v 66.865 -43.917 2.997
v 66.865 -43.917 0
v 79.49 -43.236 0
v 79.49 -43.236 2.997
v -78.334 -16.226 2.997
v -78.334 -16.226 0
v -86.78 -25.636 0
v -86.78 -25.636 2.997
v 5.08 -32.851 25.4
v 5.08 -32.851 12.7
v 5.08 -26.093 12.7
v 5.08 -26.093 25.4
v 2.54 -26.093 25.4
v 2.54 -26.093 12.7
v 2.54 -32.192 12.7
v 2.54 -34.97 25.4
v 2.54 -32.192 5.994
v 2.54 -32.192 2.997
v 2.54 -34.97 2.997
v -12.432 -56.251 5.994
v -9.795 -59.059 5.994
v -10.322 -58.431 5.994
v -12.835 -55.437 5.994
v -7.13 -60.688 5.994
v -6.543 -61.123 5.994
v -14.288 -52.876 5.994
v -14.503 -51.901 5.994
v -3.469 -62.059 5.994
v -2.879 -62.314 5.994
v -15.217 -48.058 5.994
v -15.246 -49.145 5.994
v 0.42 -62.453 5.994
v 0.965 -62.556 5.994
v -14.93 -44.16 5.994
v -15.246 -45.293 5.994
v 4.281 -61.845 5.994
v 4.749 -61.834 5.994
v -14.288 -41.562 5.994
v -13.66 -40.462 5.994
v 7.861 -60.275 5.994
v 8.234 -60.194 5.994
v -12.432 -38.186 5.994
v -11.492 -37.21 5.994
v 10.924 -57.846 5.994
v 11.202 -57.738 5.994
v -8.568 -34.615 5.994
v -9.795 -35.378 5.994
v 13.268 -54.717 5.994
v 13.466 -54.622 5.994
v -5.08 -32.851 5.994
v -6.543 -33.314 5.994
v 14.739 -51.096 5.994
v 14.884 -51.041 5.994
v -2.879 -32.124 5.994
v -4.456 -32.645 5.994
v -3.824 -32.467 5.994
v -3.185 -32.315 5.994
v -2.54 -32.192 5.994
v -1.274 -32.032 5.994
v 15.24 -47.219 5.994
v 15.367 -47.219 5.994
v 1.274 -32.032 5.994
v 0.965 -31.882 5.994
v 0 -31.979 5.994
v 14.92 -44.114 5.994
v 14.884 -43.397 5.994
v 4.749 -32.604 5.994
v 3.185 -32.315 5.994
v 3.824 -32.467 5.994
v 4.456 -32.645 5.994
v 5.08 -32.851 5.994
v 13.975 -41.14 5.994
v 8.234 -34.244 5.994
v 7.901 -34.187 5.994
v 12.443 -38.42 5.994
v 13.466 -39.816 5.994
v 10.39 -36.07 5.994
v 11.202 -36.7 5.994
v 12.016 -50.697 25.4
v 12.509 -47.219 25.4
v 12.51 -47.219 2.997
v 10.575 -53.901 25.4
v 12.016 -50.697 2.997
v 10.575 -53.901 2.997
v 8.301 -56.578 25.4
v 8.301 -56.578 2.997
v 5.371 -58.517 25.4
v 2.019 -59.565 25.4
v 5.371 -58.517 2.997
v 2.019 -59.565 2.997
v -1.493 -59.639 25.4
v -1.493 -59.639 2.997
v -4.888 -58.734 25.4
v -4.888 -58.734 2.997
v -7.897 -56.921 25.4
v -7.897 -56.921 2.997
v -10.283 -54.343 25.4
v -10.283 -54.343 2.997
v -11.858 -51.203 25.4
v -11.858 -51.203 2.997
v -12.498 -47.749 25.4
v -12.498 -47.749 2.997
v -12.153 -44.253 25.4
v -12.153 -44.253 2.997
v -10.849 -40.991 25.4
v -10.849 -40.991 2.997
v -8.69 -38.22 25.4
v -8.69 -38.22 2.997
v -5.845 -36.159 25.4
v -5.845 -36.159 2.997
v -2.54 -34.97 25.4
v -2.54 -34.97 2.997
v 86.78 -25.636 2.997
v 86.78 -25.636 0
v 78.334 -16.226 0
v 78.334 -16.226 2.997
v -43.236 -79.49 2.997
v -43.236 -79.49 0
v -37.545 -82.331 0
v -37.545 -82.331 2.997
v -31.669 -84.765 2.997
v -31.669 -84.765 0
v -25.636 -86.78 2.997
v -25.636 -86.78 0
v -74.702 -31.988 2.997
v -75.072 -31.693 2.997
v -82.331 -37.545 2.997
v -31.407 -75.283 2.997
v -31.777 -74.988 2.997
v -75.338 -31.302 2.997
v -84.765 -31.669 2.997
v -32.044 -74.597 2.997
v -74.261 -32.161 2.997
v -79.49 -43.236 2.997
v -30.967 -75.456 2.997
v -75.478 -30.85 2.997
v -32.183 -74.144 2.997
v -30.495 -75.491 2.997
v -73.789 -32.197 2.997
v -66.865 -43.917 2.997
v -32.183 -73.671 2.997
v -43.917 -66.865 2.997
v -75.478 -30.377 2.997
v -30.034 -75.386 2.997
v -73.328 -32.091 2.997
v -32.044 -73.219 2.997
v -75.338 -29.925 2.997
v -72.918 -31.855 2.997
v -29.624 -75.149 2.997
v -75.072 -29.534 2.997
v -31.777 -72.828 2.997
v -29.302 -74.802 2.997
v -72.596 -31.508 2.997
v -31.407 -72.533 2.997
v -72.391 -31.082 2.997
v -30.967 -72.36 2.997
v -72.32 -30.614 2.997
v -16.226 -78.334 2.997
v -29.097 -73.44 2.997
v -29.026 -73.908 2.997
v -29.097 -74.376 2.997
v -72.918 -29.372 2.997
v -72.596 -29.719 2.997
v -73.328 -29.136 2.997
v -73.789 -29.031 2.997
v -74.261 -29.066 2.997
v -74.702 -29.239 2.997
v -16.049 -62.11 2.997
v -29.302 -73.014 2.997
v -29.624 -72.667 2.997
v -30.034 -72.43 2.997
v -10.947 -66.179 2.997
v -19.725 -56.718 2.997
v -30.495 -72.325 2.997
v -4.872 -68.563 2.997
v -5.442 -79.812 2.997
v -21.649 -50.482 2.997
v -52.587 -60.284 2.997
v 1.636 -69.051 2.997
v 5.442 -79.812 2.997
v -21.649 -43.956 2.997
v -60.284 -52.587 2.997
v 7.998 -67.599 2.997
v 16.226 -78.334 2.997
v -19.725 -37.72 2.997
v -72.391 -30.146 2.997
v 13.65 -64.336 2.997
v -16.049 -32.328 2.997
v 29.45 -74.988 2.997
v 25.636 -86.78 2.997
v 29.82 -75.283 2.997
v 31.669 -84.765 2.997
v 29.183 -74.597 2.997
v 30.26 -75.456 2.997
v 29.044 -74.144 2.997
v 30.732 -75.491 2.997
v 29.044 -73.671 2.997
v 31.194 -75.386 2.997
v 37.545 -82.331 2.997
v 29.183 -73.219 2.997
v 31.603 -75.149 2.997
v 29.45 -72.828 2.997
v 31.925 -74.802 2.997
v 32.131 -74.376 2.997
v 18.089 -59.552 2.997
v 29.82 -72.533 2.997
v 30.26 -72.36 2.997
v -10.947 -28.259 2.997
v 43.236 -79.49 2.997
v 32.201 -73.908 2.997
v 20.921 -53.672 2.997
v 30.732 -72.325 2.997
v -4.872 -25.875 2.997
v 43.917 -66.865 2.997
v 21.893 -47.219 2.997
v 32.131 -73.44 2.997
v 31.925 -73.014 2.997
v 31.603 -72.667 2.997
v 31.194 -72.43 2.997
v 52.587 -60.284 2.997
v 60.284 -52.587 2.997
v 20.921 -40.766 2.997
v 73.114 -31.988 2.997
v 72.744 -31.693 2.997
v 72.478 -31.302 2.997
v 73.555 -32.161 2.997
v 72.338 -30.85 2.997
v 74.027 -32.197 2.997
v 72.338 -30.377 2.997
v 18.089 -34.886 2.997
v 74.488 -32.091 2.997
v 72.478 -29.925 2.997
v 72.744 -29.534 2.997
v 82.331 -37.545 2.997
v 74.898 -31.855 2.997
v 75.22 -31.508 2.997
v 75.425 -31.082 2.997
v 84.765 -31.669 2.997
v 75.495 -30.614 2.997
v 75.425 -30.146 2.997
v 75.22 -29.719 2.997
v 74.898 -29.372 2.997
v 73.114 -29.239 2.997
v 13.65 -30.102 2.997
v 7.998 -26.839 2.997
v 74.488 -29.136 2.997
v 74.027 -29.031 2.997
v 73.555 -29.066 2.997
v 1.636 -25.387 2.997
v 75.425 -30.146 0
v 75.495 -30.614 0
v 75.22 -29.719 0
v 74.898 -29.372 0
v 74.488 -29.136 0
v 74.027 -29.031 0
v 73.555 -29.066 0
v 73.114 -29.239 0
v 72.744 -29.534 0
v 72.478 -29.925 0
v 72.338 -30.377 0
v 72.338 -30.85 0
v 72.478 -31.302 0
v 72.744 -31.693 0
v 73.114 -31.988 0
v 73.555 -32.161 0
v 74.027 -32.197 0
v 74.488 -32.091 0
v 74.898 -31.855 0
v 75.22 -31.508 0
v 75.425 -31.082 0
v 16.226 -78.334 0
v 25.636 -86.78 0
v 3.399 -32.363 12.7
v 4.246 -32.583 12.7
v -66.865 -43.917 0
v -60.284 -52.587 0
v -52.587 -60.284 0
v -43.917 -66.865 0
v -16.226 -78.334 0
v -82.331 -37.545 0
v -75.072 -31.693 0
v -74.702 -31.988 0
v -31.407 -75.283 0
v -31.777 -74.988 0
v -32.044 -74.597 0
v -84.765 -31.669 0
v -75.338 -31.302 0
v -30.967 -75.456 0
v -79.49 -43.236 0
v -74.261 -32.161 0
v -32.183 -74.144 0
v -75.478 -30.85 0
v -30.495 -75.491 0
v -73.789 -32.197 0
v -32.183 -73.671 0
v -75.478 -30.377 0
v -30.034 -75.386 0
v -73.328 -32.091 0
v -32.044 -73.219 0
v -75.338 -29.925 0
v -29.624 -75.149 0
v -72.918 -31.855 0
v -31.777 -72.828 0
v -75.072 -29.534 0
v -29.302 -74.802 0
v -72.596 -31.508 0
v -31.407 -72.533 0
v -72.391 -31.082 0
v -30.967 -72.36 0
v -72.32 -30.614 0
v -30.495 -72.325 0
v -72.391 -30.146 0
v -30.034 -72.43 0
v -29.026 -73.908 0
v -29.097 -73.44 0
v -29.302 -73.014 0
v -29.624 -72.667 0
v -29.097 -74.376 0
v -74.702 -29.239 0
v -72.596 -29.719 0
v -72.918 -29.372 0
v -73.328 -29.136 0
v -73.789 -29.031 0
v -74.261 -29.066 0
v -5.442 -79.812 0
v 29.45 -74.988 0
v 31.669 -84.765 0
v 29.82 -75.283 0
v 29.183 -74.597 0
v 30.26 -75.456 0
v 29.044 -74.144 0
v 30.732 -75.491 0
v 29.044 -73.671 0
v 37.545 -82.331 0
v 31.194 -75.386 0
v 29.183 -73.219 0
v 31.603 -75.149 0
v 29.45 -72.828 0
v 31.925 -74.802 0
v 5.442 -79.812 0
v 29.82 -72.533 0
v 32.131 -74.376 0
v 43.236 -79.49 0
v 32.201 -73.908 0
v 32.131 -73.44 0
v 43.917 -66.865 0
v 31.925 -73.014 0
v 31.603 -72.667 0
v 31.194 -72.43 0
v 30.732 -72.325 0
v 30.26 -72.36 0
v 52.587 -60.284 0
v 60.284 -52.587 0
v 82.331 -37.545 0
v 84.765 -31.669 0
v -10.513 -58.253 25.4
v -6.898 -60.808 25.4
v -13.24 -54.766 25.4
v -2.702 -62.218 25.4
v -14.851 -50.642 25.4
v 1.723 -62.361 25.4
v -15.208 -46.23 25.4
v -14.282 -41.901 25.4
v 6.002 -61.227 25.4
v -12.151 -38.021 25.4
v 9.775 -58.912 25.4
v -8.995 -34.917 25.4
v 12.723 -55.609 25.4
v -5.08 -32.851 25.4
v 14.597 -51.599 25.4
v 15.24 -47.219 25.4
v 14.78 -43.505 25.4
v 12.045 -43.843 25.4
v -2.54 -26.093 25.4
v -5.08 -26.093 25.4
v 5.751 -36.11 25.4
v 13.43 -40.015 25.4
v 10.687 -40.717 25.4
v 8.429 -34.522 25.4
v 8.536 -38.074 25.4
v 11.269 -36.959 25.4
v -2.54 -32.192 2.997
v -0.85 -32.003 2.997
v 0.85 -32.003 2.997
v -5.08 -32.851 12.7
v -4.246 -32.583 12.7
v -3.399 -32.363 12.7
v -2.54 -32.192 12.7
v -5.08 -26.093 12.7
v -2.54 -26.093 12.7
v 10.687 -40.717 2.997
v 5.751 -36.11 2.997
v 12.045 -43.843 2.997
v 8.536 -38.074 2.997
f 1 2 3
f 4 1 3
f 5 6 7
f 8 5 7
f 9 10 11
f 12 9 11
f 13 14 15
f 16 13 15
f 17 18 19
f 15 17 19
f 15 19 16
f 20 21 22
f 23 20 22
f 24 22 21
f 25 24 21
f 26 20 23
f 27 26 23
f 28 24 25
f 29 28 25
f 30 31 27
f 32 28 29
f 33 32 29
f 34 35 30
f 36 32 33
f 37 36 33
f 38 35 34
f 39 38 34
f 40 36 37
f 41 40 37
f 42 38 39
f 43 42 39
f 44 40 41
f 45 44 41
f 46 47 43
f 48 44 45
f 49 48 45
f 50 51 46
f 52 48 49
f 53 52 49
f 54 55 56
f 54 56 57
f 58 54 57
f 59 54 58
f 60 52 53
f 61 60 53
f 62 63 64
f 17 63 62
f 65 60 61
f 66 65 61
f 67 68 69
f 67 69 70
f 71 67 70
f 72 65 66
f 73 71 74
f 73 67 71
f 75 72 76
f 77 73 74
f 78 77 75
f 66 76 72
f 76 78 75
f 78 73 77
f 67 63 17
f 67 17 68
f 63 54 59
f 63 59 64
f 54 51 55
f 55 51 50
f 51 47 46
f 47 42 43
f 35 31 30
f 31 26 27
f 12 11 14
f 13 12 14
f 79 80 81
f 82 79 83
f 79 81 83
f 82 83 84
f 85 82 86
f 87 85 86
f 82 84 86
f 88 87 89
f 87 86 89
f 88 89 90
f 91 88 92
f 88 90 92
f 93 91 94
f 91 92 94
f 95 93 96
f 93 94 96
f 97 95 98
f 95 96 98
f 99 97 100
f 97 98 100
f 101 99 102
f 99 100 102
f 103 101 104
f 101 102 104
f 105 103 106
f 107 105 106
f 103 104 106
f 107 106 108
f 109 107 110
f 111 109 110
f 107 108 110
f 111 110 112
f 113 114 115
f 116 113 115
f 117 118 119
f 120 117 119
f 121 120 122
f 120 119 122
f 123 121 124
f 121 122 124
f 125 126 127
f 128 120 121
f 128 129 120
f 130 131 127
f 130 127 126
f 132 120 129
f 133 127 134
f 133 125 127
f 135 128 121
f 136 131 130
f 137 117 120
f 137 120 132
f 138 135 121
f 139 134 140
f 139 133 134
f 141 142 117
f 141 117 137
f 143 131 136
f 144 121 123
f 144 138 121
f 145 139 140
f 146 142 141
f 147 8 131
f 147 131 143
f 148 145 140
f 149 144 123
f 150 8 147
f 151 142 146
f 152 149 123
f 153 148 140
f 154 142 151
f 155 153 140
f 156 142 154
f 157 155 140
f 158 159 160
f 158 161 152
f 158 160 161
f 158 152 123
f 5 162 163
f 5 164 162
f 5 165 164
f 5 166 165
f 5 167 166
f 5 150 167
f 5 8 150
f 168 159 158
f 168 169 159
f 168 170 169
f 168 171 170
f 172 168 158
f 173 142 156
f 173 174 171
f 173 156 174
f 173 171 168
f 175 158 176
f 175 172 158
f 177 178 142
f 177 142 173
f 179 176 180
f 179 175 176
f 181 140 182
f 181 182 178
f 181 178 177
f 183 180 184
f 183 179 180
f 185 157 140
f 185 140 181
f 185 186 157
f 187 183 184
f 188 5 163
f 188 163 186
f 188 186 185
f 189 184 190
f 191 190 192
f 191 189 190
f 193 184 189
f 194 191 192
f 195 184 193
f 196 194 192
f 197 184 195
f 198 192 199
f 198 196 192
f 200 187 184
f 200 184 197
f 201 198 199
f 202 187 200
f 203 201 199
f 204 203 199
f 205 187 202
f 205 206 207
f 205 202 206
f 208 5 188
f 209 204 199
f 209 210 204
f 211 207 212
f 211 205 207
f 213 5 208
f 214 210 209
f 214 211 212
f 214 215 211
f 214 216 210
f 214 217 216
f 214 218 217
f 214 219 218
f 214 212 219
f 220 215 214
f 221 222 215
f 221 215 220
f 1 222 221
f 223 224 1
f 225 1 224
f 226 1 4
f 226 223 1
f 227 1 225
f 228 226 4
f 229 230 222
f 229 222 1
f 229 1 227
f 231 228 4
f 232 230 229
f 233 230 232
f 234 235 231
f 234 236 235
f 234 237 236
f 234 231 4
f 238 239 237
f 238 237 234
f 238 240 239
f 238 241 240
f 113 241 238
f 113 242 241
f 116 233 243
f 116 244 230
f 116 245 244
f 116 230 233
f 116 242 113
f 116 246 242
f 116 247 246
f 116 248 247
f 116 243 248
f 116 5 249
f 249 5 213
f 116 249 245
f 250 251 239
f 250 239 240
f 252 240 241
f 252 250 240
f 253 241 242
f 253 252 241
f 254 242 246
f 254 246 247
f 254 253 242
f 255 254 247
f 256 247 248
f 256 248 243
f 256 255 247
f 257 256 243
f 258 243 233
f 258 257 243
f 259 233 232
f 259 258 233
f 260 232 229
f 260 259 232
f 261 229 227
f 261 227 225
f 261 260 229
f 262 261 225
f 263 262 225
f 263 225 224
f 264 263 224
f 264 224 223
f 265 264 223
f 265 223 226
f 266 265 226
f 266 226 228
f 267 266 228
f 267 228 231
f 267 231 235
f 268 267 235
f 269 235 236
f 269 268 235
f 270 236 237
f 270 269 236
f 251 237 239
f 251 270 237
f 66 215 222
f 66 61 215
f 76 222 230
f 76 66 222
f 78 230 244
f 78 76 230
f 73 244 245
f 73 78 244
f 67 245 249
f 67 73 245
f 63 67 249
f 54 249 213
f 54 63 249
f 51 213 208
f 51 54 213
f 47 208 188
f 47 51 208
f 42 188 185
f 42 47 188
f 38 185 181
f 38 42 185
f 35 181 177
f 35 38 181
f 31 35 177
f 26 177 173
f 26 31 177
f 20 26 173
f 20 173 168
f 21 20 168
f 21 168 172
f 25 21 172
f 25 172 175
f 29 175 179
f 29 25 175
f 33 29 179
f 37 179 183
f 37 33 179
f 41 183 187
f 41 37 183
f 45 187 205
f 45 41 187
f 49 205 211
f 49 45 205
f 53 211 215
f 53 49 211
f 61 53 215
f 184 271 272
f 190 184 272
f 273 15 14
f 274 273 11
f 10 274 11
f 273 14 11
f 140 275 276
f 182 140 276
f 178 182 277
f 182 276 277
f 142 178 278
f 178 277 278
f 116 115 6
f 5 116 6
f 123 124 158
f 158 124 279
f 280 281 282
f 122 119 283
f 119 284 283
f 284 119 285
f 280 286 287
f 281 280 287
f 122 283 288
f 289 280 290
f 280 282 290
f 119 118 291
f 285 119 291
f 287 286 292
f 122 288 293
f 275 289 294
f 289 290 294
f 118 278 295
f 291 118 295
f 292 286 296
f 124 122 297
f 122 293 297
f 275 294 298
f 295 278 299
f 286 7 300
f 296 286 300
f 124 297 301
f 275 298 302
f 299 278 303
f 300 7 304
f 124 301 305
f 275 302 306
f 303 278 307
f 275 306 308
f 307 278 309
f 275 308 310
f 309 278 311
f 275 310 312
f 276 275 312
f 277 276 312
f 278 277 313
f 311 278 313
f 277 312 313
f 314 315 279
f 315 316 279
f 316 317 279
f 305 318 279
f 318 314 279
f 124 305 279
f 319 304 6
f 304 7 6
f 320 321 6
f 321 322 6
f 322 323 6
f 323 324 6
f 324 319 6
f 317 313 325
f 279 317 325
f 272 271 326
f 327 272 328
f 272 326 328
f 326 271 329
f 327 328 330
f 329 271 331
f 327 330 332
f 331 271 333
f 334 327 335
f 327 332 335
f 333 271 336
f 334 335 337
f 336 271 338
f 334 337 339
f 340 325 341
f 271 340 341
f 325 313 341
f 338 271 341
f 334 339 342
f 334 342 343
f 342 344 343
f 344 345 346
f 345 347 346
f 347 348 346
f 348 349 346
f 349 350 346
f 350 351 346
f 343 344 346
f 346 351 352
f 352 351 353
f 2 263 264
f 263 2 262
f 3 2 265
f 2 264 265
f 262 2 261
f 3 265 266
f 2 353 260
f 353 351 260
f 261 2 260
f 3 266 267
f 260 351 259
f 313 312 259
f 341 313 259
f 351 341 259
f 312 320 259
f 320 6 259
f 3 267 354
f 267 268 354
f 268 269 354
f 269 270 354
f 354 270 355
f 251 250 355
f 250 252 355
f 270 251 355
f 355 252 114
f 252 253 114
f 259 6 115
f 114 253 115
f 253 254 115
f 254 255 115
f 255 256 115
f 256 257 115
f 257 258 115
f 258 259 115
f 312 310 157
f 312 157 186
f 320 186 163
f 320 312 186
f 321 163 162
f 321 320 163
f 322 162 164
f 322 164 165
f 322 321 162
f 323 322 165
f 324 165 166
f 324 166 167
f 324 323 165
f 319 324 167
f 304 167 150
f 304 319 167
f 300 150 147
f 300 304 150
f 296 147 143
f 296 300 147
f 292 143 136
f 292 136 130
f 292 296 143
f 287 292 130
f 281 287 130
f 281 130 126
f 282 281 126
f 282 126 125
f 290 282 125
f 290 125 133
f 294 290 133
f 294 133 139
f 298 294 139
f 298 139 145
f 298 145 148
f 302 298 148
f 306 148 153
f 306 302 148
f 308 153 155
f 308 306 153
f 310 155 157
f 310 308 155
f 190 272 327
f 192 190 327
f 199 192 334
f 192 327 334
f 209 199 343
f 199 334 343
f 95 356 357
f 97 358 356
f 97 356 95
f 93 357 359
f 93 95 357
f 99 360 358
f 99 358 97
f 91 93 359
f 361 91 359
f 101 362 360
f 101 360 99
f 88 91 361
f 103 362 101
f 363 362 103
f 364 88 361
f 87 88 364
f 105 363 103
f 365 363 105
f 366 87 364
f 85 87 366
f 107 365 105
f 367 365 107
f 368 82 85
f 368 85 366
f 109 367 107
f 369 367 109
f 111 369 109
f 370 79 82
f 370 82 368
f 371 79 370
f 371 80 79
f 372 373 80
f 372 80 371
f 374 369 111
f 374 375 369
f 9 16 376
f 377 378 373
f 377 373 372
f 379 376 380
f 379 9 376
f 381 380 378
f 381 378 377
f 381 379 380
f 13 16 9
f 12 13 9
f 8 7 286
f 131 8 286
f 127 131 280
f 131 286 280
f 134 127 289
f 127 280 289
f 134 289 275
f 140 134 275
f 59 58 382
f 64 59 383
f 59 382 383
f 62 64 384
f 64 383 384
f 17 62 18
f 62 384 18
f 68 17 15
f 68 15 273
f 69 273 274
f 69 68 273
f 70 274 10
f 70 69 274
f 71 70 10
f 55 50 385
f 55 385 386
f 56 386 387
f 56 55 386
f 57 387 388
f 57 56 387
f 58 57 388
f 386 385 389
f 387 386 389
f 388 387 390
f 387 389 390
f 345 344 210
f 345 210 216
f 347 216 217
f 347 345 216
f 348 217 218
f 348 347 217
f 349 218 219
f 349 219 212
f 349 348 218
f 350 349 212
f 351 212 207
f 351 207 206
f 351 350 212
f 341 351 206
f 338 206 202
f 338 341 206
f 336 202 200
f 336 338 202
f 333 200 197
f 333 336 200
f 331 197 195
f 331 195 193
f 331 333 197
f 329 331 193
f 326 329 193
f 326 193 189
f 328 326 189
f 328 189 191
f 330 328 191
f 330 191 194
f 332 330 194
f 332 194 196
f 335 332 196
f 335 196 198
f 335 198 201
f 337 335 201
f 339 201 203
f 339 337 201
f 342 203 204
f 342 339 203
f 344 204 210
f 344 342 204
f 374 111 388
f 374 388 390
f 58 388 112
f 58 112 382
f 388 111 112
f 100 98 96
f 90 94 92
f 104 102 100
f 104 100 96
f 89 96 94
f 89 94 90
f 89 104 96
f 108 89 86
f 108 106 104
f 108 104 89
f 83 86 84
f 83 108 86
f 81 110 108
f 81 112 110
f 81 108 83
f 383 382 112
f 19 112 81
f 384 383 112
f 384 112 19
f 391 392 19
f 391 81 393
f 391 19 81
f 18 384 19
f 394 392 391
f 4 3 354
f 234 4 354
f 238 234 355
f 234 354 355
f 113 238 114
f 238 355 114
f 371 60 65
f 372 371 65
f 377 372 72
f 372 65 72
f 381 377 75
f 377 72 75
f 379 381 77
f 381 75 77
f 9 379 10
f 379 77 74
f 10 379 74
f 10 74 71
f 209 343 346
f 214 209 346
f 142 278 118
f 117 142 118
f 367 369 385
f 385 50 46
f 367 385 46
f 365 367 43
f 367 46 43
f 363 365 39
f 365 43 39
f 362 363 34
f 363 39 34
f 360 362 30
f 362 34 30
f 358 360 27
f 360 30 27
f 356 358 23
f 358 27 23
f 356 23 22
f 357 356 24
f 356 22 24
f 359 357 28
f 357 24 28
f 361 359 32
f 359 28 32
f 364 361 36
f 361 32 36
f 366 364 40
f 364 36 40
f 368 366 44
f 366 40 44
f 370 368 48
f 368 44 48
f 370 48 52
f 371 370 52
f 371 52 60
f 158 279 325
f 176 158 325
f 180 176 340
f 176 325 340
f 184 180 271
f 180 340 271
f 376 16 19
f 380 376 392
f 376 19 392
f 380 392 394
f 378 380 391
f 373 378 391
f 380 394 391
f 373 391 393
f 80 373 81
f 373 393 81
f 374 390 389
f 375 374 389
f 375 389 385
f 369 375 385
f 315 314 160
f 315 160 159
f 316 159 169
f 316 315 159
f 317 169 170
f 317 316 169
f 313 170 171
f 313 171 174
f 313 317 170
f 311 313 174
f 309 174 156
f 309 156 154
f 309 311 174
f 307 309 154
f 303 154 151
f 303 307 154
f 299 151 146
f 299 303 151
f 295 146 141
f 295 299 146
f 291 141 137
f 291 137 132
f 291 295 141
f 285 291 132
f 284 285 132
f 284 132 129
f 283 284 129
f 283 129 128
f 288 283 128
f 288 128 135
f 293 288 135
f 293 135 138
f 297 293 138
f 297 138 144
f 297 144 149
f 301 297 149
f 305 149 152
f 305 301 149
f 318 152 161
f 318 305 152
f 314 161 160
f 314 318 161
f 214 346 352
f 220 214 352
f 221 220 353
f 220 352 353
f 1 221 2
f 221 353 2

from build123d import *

# Parameters (mm, degrees)
F0_R     = 1.5875
F0_R_2   = 22.225
F1_DEPTH = 2.9972
F2_DEPTH = 25.4
F3_DEPTH = 25.4
F4_DEPTH = 12.7
F5_DEPTH = 2.9972
F6_DEPTH = 5.9944


# Not quite as in the source:
# - a fillet or chamfer that OpenCascade refuses, or shapes differently, is made with other operations: its cross-section is extruded or revolved along the edge and cut away or added


with BuildPart() as f1:
    # F0 (on Top) → F1 (new body)
    with BuildSketch(Plane.XY):
        with BuildLine():
            Line((-78.3343552322, -16.2264228234), (-86.7801633577, -25.6357348999))
            ThreePointArc((-86.7801633577, -25.6357348999), (-83.5995491981, -34.6280670861), (-79.4900439712, -43.2356399943))
            Line((-79.4900439712, -43.2356399943), (-66.8645673974, -43.9169401718))
            ThreePointArc((-66.8645673974, -43.9169401718), (-56.5666333066, -56.5666333066), (-43.9169401718, -66.8645673974))
            Line((-43.9169401718, -66.8645673974), (-43.2356399943, -79.4900439712))
            ThreePointArc((-43.2356399943, -79.4900439712), (-34.6280670861, -83.5995491981), (-25.6357348999, -86.7801633577))
            Line((-25.6357348999, -86.7801633577), (-16.2264228234, -78.3343552322))
            ThreePointArc((-16.2264228234, -78.3343552322), (0, -79.9973), (16.2264228234, -78.3343552322))
            Line((16.2264228234, -78.3343552322), (25.6357348999, -86.7801633577))
            ThreePointArc((25.6357348999, -86.7801633577), (34.6280670861, -83.5995491981), (43.2356399943, -79.4900439712))
            Line((43.2356399943, -79.4900439712), (43.9169401718, -66.8645673974))
            ThreePointArc((43.9169401718, -66.8645673974), (56.5666333066, -56.5666333066), (66.8645673974, -43.9169401718))
            Line((66.8645673974, -43.9169401718), (79.4900439712, -43.2356399943))
            ThreePointArc((79.4900439712, -43.2356399943), (83.5995491981, -34.6280670861), (86.7801633577, -25.6357348999))
            Line((86.7801633577, -25.6357348999), (78.3343552322, -16.2264228234))
            Line((78.3343552322, -16.2264228234), (-78.3343552322, -16.2264228234))
        make_face()
        with Locations((-30.6136413439, -73.9078681262)):
            Circle(F0_R, mode=Mode.SUBTRACT)
        with Locations((30.6136413439, -73.9078681262)):
            Circle(F0_R, mode=Mode.SUBTRACT)
        with Locations((0, -47.218952328)):
            Circle(F0_R_2, mode=Mode.SUBTRACT)
        with Locations((-73.9078681262, -30.6136413439)):
            Circle(F0_R, mode=Mode.SUBTRACT)
        with Locations((73.9078681262, -30.6136413439)):
            Circle(F0_R, mode=Mode.SUBTRACT)
        with Locations((0, -47.218952328)):
            Circle(F0_R_2)
        with BuildLine():
            ThreePointArc((5.08, -32.8505425343), (12.4434078933, -38.4201342255), (15.24, -47.218952328))
            ThreePointArc((15.24, -47.218952328), (-8.7988181024, -59.6623602213), (-5.08, -32.8505425343))
            Line((-5.08, -32.8505425343), (-5.08, -26.0933935642))
            Line((-5.08, -26.0933935642), (-2.54, -26.0933935642))
            Line((-2.54, -26.0933935642), (-2.54, -32.1921096789))
            ThreePointArc((-2.54, -32.1921096789), (0, -31.978952328), (2.54, -32.1921096789))
            Line((2.54, -32.1921096789), (2.54, -26.0933935642))
            Line((2.54, -26.0933935642), (5.08, -26.0933935642))
            Line((5.08, -26.0933935642), (5.08, -32.8505425343))
        make_face(mode=Mode.SUBTRACT)
        with BuildLine():
            ThreePointArc((-5.08, -32.8505425343), (-8.7988181024, -59.6623602213), (15.24, -47.218952328))
            ThreePointArc((15.24, -47.218952328), (12.4434078933, -38.4201342255), (5.08, -32.8505425343))
            ThreePointArc((5.08, -32.8505425343), (3.8241970996, -32.466558741), (2.54, -32.1921096789))
            Line((2.54, -32.1921096789), (2.54, -34.9700344064))
            ThreePointArc((2.54, -34.9700344064), (9.7021059634, -39.3223245588), (12.5095, -47.218952328))
            ThreePointArc((12.5095, -47.218952328), (-7.8966277692, -56.9210582914), (-2.54, -34.9700344064))
            Line((-2.54, -34.9700344064), (-2.54, -32.1921096789))
            ThreePointArc((-2.54, -32.1921096789), (-3.8241970996, -32.466558741), (-5.08, -32.8505425343))
        make_face()
        with BuildLine():
            ThreePointArc((2.54, -32.1921096789), (3.8241970996, -32.466558741), (5.08, -32.8505425343))
            Line((5.08, -32.8505425343), (5.08, -26.0933935642))
            Line((5.08, -26.0933935642), (2.54, -26.0933935642))
            Line((2.54, -26.0933935642), (2.54, -32.1921096789))
        make_face()
        with BuildLine():
            Line((-5.08, -26.0933935642), (-5.08, -32.8505425343))
            ThreePointArc((-5.08, -32.8505425343), (-3.8241970996, -32.466558741), (-2.54, -32.1921096789))
            Line((-2.54, -32.1921096789), (-2.54, -26.0933935642))
            Line((-2.54, -26.0933935642), (-5.08, -26.0933935642))
        make_face()
        with BuildLine():
            Line((2.54, -34.9700344064), (2.54, -32.1921096789))
            ThreePointArc((2.54, -32.1921096789), (0, -31.978952328), (-2.54, -32.1921096789))
            Line((-2.54, -32.1921096789), (-2.54, -34.9700344064))
            ThreePointArc((-2.54, -34.9700344064), (0, -34.709452328), (2.54, -34.9700344064))
        make_face()
        with BuildLine():
            ThreePointArc((12.5095, -47.218952328), (9.7021059634, -39.3223245588), (2.54, -34.9700344064))
            ThreePointArc((2.54, -34.9700344064), (0, -34.709452328), (-2.54, -34.9700344064))
            ThreePointArc((-2.54, -34.9700344064), (-7.8966277692, -56.9210582914), (12.5095, -47.218952328))
        make_face()
    extrude(amount=F1_DEPTH)

    # F0 (on Top) → F2 (join)
    with BuildSketch(Plane.XY):
        with BuildLine():
            ThreePointArc((-5.08, -32.8505425343), (-8.7988181024, -59.6623602213), (15.24, -47.218952328))
            ThreePointArc((15.24, -47.218952328), (12.4434078933, -38.4201342255), (5.08, -32.8505425343))
            ThreePointArc((5.08, -32.8505425343), (3.8241970996, -32.466558741), (2.54, -32.1921096789))
            Line((2.54, -32.1921096789), (2.54, -34.9700344064))
            ThreePointArc((2.54, -34.9700344064), (9.7021059634, -39.3223245588), (12.5095, -47.218952328))
            ThreePointArc((12.5095, -47.218952328), (-7.8966277692, -56.9210582914), (-2.54, -34.9700344064))
            Line((-2.54, -34.9700344064), (-2.54, -32.1921096789))
            ThreePointArc((-2.54, -32.1921096789), (-3.8241970996, -32.466558741), (-5.08, -32.8505425343))
        make_face()
    extrude(amount=F2_DEPTH)

    # F0 (on Top) → F3 (join)
    with BuildSketch(Plane.XY):
        with BuildLine():
            ThreePointArc((-5.08, -32.8505425343), (-8.7988181024, -59.6623602213), (15.24, -47.218952328))
            ThreePointArc((15.24, -47.218952328), (12.4434078933, -38.4201342255), (5.08, -32.8505425343))
            ThreePointArc((5.08, -32.8505425343), (3.8241970996, -32.466558741), (2.54, -32.1921096789))
            Line((2.54, -32.1921096789), (2.54, -34.9700344064))
            ThreePointArc((2.54, -34.9700344064), (9.7021059634, -39.3223245588), (12.5095, -47.218952328))
            ThreePointArc((12.5095, -47.218952328), (-7.8966277692, -56.9210582914), (-2.54, -34.9700344064))
            Line((-2.54, -34.9700344064), (-2.54, -32.1921096789))
            ThreePointArc((-2.54, -32.1921096789), (-3.8241970996, -32.466558741), (-5.08, -32.8505425343))
        make_face()
        with BuildLine():
            ThreePointArc((2.54, -32.1921096789), (3.8241970996, -32.466558741), (5.08, -32.8505425343))
            Line((5.08, -32.8505425343), (5.08, -26.0933935642))
            Line((5.08, -26.0933935642), (2.54, -26.0933935642))
            Line((2.54, -26.0933935642), (2.54, -32.1921096789))
        make_face()
        with BuildLine():
            Line((-5.08, -26.0933935642), (-5.08, -32.8505425343))
            ThreePointArc((-5.08, -32.8505425343), (-3.8241970996, -32.466558741), (-2.54, -32.1921096789))
            Line((-2.54, -32.1921096789), (-2.54, -26.0933935642))
            Line((-2.54, -26.0933935642), (-5.08, -26.0933935642))
        make_face()
    extrude(amount=F3_DEPTH)

    # F0 (on Top) → F4 (cut)
    with BuildSketch(Plane.XY):
        with BuildLine():
            ThreePointArc((2.54, -32.1921096789), (3.8241970996, -32.466558741), (5.08, -32.8505425343))
            Line((5.08, -32.8505425343), (5.08, -26.0933935642))
            Line((5.08, -26.0933935642), (2.54, -26.0933935642))
            Line((2.54, -26.0933935642), (2.54, -32.1921096789))
        make_face()
        with BuildLine():
            Line((-5.08, -26.0933935642), (-5.08, -32.8505425343))
            ThreePointArc((-5.08, -32.8505425343), (-3.8241970996, -32.466558741), (-2.54, -32.1921096789))
            Line((-2.54, -32.1921096789), (-2.54, -26.0933935642))
            Line((-2.54, -26.0933935642), (-5.08, -26.0933935642))
        make_face()
    extrude(amount=F4_DEPTH, mode=Mode.SUBTRACT)

    # F0 (on Top) → F5 (join)
    with BuildSketch(Plane.XY):
        with BuildLine():
            ThreePointArc((2.54, -32.1921096789), (3.8241970996, -32.466558741), (5.08, -32.8505425343))
            Line((5.08, -32.8505425343), (5.08, -26.0933935642))
            Line((5.08, -26.0933935642), (2.54, -26.0933935642))
            Line((2.54, -26.0933935642), (2.54, -32.1921096789))
        make_face()
        with BuildLine():
            Line((-5.08, -26.0933935642), (-5.08, -32.8505425343))
            ThreePointArc((-5.08, -32.8505425343), (-3.8241970996, -32.466558741), (-2.54, -32.1921096789))
            Line((-2.54, -32.1921096789), (-2.54, -26.0933935642))
            Line((-2.54, -26.0933935642), (-5.08, -26.0933935642))
        make_face()
    extrude(amount=F5_DEPTH)

    # F0 (on Top) → F6 (join)
    with BuildSketch(Plane.XY):
        with Locations((0, -47.218952328)):
            Circle(F0_R_2)
        with BuildLine():
            ThreePointArc((5.08, -32.8505425343), (12.4434078933, -38.4201342255), (15.24, -47.218952328))
            ThreePointArc((15.24, -47.218952328), (-8.7988181024, -59.6623602213), (-5.08, -32.8505425343))
            Line((-5.08, -32.8505425343), (-5.08, -26.0933935642))
            Line((-5.08, -26.0933935642), (-2.54, -26.0933935642))
            Line((-2.54, -26.0933935642), (-2.54, -32.1921096789))
            ThreePointArc((-2.54, -32.1921096789), (0, -31.978952328), (2.54, -32.1921096789))
            Line((2.54, -32.1921096789), (2.54, -26.0933935642))
            Line((2.54, -26.0933935642), (5.08, -26.0933935642))
            Line((5.08, -26.0933935642), (5.08, -32.8505425343))
        make_face(mode=Mode.SUBTRACT)
        with BuildLine():
            ThreePointArc((2.54, -32.1921096789), (3.8241970996, -32.466558741), (5.08, -32.8505425343))
            Line((5.08, -32.8505425343), (5.08, -26.0933935642))
            Line((5.08, -26.0933935642), (2.54, -26.0933935642))
            Line((2.54, -26.0933935642), (2.54, -32.1921096789))
        make_face()
        with BuildLine():
            Line((-5.08, -26.0933935642), (-5.08, -32.8505425343))
            ThreePointArc((-5.08, -32.8505425343), (-3.8241970996, -32.466558741), (-2.54, -32.1921096789))
            Line((-2.54, -32.1921096789), (-2.54, -26.0933935642))
            Line((-2.54, -26.0933935642), (-5.08, -26.0933935642))
        make_face()
    extrude(amount=F6_DEPTH)

    # F7: chamfer of 6.858 x 3.1496 on 1 edges, made by hand


with BuildPart() as f7_tool2:
    # F7_s3 → F7_t4 (revolve)
    with BuildSketch(Plane.XZ.offset(47.218952328)):
        Polygon((22.225, 2.8448), (15.367, 5.9944), (22.225, 5.9944), align=None)
    revolve(axis=Axis((0, -47.218952328, 5.9944), (0, 0, 1)))

    split(bisect_by=Plane.XY.offset(2.9972), keep=Keep.TOP)


with BuildPart() as f1_1:
    add(f1.part)

    # F7_t1: cut F7_tool2
    add(f7_tool2.part, mode=Mode.SUBTRACT)


solid = f1_1.part
